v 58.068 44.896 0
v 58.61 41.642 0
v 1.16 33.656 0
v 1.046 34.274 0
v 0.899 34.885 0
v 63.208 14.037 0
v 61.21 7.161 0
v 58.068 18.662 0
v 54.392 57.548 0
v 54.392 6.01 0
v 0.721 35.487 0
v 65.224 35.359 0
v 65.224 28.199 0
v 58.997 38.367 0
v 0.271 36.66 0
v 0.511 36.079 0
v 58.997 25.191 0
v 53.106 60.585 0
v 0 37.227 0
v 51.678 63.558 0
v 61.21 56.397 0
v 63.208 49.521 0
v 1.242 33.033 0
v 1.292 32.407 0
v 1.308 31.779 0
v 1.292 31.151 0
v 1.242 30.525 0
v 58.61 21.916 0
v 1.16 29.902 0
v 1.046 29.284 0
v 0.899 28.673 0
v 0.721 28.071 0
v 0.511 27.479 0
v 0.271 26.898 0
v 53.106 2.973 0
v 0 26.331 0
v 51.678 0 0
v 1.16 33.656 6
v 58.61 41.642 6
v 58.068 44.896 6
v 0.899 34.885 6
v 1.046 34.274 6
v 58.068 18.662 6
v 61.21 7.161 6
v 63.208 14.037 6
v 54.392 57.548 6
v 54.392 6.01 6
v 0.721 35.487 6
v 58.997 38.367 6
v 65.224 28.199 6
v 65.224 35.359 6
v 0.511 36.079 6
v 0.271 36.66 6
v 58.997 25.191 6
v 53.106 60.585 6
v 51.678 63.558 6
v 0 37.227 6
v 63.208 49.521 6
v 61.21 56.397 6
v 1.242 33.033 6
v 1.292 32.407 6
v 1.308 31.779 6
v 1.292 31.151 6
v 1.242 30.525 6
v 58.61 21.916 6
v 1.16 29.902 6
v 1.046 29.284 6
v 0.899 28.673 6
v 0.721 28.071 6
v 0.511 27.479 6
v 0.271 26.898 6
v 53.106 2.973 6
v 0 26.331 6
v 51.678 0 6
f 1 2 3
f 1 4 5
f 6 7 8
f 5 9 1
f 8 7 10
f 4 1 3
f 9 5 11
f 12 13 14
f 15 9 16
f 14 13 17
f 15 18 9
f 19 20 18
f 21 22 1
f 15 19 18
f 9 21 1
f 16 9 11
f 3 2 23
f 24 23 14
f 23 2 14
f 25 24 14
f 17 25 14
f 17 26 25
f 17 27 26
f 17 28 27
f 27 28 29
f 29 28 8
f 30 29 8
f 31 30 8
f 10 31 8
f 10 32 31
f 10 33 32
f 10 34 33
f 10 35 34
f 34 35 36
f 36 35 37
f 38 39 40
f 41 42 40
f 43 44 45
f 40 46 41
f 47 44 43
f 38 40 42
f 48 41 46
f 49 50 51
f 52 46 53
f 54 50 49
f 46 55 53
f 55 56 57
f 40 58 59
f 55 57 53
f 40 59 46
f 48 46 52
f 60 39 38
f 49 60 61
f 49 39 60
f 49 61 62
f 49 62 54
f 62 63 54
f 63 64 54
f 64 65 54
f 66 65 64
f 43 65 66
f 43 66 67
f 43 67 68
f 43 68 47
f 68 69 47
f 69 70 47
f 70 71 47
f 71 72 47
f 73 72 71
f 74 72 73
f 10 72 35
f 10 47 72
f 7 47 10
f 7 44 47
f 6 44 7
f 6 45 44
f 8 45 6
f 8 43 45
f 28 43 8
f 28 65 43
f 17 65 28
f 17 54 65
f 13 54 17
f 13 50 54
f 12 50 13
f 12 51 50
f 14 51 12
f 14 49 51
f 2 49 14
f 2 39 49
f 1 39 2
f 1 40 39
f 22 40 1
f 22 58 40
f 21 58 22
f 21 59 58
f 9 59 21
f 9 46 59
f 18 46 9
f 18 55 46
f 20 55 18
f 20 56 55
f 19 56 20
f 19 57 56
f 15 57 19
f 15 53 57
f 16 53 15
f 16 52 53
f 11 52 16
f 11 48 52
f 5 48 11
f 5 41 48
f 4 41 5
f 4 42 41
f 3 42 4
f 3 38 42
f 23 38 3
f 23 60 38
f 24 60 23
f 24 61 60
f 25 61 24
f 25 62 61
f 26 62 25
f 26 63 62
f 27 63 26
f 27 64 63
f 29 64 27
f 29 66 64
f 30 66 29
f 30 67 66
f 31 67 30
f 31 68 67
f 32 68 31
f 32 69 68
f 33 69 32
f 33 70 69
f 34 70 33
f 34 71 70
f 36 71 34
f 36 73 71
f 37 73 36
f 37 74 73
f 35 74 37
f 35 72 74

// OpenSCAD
$fn = 32;

// ----------------------------------------------------------------------
// Gear sector: 3 teeth on 54 degrees
// ----------------------------------------------------------------------

// --- parameters (mm) ---
sector_angle = 54;        // sector angle, degrees
root_r = 70;              // root circle radius
tooth_h = 6;              // tooth height over the root circle
teeth = 3;                // number of teeth on the sector
hub_r = 12;               // hub bore radius
plate_t = 6;              // sector thickness, Z
arc_step = 3;             // sampling step of the root/hub arcs, degrees

tip_r = root_r + tooth_h;  // tip circle radius

profile = [[51.678, 0], [53.106, 2.973], [54.392, 6.01], [61.21, 7.161], [63.208, 14.037], [58.068, 18.662], [58.61, 21.916], [58.997, 25.191], [65.224, 28.199], [65.224, 35.359], [58.997, 38.367], [58.61, 41.642], [58.068, 44.896], [63.208, 49.521], [61.21, 56.397], [54.392, 57.548], [53.106, 60.585], [51.678, 63.558], [0, 37.227], [0.271, 36.66], [0.511, 36.079], [0.721, 35.487], [0.899, 34.885], [1.046, 34.274], [1.16, 33.656], [1.242, 33.033], [1.292, 32.407], [1.308, 31.779], [1.292, 31.151], [1.242, 30.525], [1.16, 29.902], [1.046, 29.284], [0.899, 28.673], [0.721, 28.071], [0.511, 27.479], [0.271, 26.898], [0, 26.331]];  // primary outline, 37 points, counter clockwise

// --- the one profile operation ---
linear_extrude(height = plate_t) polygon(points = profile);
